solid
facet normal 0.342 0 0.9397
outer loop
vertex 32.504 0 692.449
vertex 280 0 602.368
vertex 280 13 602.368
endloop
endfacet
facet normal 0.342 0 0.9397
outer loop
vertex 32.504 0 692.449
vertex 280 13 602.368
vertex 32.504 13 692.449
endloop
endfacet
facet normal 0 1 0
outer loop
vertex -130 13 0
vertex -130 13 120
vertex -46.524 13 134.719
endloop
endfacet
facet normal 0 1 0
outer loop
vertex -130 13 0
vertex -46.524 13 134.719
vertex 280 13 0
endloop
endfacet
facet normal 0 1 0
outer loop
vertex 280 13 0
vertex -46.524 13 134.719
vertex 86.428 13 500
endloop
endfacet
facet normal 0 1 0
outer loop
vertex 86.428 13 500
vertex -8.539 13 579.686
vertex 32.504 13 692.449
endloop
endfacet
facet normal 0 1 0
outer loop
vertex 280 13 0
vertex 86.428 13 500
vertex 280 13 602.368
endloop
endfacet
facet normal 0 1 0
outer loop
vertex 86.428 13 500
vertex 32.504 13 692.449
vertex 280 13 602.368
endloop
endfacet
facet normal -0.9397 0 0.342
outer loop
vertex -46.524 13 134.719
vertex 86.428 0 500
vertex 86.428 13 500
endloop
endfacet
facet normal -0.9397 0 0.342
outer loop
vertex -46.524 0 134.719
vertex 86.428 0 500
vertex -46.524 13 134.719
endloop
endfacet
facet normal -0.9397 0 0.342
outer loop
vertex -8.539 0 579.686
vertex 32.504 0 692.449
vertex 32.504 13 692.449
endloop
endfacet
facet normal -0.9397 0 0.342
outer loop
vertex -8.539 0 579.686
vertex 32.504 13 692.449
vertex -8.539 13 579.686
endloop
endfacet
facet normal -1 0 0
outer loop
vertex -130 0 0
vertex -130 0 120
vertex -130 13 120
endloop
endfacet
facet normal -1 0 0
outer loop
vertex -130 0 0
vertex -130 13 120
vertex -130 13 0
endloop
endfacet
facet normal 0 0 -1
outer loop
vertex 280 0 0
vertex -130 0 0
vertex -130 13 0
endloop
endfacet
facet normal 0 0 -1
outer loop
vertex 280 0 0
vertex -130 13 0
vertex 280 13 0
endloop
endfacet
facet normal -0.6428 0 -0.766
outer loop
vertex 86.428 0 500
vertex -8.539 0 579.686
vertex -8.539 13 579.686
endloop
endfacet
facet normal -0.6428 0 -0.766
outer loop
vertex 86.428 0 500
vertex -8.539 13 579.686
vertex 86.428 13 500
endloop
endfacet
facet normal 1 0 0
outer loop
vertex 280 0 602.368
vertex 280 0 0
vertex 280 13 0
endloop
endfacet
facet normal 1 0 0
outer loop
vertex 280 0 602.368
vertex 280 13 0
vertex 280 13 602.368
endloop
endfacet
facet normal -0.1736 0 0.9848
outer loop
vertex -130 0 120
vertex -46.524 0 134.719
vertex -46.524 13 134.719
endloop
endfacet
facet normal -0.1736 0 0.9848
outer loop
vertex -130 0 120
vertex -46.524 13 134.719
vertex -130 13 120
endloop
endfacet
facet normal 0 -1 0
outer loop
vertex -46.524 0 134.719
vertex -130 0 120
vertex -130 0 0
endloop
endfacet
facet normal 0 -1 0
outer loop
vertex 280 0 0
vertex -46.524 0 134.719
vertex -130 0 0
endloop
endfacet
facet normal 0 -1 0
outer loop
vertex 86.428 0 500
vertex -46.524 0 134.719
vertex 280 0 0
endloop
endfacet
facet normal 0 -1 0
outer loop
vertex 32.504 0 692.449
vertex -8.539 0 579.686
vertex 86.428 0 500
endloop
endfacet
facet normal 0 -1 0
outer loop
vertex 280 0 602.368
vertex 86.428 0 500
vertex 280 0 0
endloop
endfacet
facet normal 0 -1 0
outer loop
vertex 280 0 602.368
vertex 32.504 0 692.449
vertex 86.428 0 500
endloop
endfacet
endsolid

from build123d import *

# Parameters (mm, degrees)
PAD_DEPTH = 13


with BuildPart() as part:
    # Sketch → Pad (new body)
    with BuildSketch(Plane.XZ):
        Polygon((0, 0), (280, 0), (280, 445.460485), (280, 602.368169), (32.503594, 692.449494), (-8.538824, 579.68638), (86.427706, 500), (-46.523657, 134.719131), (-130, 120), (-130, 0), align=None)
    extrude(amount=-PAD_DEPTH)


solid = part.part
